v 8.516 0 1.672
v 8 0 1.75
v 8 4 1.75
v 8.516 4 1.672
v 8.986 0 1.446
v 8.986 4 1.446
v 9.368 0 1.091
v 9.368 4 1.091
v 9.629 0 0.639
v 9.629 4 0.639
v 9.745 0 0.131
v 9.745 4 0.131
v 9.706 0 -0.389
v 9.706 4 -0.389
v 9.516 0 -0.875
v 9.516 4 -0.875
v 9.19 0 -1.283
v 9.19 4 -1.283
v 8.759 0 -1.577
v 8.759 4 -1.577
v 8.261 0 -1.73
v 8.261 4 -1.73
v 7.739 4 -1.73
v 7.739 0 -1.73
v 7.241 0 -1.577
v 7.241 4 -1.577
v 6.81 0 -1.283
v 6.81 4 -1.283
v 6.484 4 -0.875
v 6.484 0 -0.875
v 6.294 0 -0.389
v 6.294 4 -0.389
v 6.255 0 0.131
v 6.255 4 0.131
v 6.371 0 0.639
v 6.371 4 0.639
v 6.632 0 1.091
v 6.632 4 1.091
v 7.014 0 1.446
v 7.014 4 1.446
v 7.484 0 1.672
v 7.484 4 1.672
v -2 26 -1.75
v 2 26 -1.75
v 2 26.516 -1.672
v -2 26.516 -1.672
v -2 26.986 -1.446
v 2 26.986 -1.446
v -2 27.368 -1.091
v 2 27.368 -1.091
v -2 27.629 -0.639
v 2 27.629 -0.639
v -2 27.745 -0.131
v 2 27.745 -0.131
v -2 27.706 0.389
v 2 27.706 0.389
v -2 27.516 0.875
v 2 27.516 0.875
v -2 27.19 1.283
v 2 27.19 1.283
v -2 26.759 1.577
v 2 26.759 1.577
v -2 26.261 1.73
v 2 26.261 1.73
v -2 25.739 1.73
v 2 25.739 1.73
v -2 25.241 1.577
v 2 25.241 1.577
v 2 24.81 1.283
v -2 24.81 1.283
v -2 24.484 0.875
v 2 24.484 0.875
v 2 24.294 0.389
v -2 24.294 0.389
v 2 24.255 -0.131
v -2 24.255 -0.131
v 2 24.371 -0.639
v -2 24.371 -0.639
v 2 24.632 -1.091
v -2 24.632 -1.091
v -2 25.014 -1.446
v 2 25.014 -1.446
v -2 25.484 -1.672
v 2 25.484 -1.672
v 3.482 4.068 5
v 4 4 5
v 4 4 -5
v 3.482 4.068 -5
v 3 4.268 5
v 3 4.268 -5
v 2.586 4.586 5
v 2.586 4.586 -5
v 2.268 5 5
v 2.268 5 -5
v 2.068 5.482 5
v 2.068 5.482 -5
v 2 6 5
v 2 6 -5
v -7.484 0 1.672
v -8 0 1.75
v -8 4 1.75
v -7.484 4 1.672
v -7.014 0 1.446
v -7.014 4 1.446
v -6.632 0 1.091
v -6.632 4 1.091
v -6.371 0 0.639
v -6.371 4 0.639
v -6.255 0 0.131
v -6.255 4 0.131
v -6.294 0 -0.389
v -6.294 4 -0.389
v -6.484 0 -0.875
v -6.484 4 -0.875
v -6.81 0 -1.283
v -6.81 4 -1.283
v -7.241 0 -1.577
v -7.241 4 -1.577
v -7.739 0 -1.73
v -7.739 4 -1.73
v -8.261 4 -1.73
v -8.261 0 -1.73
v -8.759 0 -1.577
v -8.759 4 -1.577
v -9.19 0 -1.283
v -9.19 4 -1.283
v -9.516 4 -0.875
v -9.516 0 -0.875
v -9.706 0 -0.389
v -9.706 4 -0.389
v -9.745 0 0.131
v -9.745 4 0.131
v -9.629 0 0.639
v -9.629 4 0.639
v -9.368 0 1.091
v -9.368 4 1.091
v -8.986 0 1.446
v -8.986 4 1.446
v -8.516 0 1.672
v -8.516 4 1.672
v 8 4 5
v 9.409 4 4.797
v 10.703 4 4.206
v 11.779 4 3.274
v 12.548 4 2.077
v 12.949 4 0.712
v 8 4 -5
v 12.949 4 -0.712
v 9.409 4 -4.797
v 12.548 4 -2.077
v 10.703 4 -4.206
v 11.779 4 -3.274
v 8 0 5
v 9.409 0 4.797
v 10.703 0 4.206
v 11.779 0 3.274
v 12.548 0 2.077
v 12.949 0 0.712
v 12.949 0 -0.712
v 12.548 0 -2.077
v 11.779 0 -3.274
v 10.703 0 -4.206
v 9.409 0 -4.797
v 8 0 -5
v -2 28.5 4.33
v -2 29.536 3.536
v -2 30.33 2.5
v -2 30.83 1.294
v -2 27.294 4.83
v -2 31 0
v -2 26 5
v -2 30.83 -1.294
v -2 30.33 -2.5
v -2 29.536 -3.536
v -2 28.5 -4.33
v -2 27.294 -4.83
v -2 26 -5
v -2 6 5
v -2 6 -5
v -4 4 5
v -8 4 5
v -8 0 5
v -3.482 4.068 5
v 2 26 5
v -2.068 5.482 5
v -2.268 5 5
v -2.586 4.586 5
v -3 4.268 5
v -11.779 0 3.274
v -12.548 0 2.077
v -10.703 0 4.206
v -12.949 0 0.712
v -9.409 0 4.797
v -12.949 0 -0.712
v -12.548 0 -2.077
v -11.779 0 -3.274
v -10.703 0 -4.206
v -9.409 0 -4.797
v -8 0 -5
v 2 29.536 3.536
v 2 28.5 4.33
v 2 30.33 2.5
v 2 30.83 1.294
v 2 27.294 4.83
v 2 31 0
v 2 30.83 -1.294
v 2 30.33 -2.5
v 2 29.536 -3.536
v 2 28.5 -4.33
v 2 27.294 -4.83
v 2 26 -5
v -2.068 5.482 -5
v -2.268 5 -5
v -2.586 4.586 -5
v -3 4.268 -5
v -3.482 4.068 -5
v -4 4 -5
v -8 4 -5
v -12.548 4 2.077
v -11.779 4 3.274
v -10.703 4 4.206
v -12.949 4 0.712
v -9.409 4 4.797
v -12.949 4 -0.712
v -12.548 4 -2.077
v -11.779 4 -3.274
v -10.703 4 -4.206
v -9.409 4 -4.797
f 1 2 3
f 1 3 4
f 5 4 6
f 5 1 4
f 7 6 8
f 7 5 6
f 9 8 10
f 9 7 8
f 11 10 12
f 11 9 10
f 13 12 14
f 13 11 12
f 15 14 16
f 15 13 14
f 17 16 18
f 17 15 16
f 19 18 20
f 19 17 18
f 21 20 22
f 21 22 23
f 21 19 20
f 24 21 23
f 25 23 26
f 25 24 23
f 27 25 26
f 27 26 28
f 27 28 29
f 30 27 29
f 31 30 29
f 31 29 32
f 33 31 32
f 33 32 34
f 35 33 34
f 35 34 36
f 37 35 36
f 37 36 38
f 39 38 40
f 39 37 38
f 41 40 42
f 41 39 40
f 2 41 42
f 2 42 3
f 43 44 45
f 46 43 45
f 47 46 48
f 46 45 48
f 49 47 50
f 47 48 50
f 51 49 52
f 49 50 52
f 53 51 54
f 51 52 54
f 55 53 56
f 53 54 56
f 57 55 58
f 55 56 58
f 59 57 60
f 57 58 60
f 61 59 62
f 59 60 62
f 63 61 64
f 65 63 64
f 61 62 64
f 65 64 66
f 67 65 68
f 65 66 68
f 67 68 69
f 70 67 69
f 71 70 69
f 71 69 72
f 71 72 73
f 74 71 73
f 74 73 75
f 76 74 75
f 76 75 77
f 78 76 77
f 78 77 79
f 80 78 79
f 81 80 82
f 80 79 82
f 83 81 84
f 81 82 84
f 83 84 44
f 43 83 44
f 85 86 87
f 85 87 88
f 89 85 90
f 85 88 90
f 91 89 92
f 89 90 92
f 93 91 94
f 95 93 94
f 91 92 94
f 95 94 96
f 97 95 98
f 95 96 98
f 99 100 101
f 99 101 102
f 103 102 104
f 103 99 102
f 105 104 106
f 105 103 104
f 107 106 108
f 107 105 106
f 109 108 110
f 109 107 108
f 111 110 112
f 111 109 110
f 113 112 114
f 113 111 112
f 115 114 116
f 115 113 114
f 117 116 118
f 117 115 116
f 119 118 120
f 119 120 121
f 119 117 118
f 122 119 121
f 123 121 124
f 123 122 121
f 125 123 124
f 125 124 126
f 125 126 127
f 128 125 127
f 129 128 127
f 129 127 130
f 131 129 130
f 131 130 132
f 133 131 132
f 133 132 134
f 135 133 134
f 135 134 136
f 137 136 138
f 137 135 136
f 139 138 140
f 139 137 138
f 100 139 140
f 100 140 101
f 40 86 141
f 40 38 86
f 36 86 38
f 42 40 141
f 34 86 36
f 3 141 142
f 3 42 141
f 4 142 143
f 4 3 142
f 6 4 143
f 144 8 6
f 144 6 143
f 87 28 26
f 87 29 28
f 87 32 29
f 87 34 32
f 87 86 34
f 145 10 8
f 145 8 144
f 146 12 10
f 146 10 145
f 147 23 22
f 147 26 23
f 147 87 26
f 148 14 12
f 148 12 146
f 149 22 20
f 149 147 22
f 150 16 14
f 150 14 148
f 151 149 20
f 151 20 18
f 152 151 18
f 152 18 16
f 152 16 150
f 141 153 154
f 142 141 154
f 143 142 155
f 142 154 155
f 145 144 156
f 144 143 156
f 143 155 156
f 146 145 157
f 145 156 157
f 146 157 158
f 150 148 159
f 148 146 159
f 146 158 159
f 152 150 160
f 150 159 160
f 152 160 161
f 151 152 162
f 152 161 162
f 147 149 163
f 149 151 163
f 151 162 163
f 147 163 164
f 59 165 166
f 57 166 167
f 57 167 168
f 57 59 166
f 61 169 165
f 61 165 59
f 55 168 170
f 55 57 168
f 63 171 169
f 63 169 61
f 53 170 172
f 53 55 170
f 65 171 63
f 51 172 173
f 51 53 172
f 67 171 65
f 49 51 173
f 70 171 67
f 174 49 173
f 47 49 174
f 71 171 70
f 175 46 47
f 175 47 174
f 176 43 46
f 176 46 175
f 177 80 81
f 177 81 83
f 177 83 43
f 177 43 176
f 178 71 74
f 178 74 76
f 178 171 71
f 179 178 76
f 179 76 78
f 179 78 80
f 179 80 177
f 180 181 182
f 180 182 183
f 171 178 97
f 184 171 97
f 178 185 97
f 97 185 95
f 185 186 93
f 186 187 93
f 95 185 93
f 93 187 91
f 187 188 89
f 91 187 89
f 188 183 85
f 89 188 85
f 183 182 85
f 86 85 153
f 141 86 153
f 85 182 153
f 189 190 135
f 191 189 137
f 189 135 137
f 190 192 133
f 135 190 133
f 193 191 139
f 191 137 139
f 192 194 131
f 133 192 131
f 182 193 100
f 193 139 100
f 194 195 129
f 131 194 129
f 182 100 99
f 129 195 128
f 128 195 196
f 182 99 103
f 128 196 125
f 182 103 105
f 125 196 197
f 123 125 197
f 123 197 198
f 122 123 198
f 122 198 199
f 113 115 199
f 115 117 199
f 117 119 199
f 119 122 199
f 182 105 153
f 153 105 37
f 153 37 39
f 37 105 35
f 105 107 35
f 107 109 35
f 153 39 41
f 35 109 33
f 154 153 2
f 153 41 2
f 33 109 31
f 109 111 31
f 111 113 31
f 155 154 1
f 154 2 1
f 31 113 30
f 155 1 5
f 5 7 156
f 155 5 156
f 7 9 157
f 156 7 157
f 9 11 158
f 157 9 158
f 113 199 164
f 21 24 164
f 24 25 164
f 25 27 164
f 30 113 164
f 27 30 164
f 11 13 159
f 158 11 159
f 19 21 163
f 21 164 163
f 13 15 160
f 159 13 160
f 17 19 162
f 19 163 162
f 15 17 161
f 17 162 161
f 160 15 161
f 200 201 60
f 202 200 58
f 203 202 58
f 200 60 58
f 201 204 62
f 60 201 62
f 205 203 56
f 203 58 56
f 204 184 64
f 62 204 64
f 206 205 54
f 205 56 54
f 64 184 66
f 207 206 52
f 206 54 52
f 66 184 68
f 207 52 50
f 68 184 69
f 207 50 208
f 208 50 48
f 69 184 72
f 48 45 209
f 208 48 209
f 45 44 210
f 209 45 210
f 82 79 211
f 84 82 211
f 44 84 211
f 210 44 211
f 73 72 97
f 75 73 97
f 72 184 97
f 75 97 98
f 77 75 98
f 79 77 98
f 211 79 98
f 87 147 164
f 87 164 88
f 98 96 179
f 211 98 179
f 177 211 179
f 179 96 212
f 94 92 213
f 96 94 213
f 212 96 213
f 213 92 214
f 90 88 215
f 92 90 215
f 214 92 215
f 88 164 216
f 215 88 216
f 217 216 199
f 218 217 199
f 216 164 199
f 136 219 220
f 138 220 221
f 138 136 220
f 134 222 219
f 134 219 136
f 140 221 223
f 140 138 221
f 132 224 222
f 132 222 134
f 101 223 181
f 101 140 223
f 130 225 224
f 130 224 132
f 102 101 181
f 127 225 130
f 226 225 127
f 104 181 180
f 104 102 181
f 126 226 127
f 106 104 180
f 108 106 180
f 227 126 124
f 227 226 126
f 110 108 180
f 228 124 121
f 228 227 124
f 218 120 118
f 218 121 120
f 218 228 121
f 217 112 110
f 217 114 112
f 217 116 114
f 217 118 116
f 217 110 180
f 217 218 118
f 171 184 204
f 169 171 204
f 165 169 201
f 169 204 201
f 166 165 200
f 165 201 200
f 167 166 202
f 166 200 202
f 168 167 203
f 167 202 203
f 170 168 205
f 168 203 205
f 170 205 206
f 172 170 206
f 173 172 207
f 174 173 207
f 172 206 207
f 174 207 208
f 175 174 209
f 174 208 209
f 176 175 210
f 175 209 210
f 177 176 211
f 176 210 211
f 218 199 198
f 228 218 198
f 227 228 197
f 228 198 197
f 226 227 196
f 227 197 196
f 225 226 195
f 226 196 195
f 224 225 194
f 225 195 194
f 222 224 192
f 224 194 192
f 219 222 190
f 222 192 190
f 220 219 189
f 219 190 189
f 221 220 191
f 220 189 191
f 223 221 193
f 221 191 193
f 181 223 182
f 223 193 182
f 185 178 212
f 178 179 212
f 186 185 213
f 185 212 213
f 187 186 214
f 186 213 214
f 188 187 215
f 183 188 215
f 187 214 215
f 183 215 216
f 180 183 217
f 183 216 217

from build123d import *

# Parameters (mm, degrees)
SKETCH1_R           = 5
SKETCH1_R_2         = 1.75
BOSS_EXTRUDE1_DEPTH = 4
SKETCH2_W           = 4
SKETCH2_H           = 10
BOSS_EXTRUDE2_DEPTH = 27
SKETCH3_R           = 1.75
CUT_EXTRUDE1_DEPTH  = 4
FILLET1_R           = 2
FILLET2_R           = 2


with BuildPart() as part:
    # Sketch1 → Boss-Extrude1 (new body)
    # profile 1 of 3: a face of its own
    with BuildSketch(Plane(origin=(0, 0, 0), x_dir=(1, 0, 0), z_dir=(0, 1, 0))):
        with Locations((-8, 0)):
            Circle(SKETCH1_R)
        with Locations(Location((-8, 0, 0), (0, 0, 270))):
            Circle(SKETCH1_R_2, mode=Mode.SUBTRACT)
    # profile 2 of 3: a face of its own
    with BuildSketch(Plane(origin=(0, 0, 0), x_dir=(1, 0, 0), z_dir=(0, 1, 0))):
        with BuildLine():
            Line((8, 5), (-8, 5))
            ThreePointArc((-8, 5), (-4.464466094, 3.535533906), (-3, 0))
            ThreePointArc((-3, 0), (-4.464466094, -3.535533906), (-8, -5))
            Line((-8, -5), (8, -5))
            ThreePointArc((8, -5), (3, 0), (8, 5))
        make_face()
    # profile 3 of 3: a face of its own
    with BuildSketch(Plane(origin=(0, 0, 0), x_dir=(1, 0, 0), z_dir=(0, 1, 0))):
        with Locations((8, 0)):
            Circle(SKETCH1_R)
        with Locations(Location((8, 0, 0), (0, 0, 270))):
            Circle(SKETCH1_R_2, mode=Mode.SUBTRACT)
    extrude(amount=BOSS_EXTRUDE1_DEPTH)

    # Sketch2 → Boss-Extrude2 (add)
    with BuildSketch(Plane(origin=(0, 4, 0), x_dir=(1, 0, 0), z_dir=(0, 1, 0))):
        Rectangle(SKETCH2_W, SKETCH2_H)
    extrude(amount=BOSS_EXTRUDE2_DEPTH)

    # Sketch3 → Cut-Extrude1 (cut)
    with BuildSketch(Plane(origin=(2, 0, 0), x_dir=(0, 0, -1), z_dir=(1, 0, 0))):
        with BuildLine():
            Line((-5, 31), (-5, 26))
            ThreePointArc((-5, 26), (-3.535533906, 29.535533906), (0, 31))
            Line((0, 31), (-5, 31))
        make_face()
        with BuildLine():
            ThreePointArc((0, 31), (3.535533906, 29.535533906), (5, 26))
            Line((5, 26), (5, 31))
            Line((5, 31), (0, 31))
        make_face()
        with Locations((0, 26)):
            Circle(SKETCH3_R)
    extrude(amount=-CUT_EXTRUDE1_DEPTH, mode=Mode.SUBTRACT)

    # Fillet1
    fillet1_edges = [part.edges().sort_by_distance(p)[0] for p in [
        (2, 4, 0),
    ]]
    fillet(fillet1_edges, radius=FILLET1_R)

    # Fillet2
    fillet2_edges = [part.edges().sort_by_distance(p)[0] for p in [
        (-2, 4, 0),
    ]]
    fillet(fillet2_edges, radius=FILLET2_R)


solid = part.part
